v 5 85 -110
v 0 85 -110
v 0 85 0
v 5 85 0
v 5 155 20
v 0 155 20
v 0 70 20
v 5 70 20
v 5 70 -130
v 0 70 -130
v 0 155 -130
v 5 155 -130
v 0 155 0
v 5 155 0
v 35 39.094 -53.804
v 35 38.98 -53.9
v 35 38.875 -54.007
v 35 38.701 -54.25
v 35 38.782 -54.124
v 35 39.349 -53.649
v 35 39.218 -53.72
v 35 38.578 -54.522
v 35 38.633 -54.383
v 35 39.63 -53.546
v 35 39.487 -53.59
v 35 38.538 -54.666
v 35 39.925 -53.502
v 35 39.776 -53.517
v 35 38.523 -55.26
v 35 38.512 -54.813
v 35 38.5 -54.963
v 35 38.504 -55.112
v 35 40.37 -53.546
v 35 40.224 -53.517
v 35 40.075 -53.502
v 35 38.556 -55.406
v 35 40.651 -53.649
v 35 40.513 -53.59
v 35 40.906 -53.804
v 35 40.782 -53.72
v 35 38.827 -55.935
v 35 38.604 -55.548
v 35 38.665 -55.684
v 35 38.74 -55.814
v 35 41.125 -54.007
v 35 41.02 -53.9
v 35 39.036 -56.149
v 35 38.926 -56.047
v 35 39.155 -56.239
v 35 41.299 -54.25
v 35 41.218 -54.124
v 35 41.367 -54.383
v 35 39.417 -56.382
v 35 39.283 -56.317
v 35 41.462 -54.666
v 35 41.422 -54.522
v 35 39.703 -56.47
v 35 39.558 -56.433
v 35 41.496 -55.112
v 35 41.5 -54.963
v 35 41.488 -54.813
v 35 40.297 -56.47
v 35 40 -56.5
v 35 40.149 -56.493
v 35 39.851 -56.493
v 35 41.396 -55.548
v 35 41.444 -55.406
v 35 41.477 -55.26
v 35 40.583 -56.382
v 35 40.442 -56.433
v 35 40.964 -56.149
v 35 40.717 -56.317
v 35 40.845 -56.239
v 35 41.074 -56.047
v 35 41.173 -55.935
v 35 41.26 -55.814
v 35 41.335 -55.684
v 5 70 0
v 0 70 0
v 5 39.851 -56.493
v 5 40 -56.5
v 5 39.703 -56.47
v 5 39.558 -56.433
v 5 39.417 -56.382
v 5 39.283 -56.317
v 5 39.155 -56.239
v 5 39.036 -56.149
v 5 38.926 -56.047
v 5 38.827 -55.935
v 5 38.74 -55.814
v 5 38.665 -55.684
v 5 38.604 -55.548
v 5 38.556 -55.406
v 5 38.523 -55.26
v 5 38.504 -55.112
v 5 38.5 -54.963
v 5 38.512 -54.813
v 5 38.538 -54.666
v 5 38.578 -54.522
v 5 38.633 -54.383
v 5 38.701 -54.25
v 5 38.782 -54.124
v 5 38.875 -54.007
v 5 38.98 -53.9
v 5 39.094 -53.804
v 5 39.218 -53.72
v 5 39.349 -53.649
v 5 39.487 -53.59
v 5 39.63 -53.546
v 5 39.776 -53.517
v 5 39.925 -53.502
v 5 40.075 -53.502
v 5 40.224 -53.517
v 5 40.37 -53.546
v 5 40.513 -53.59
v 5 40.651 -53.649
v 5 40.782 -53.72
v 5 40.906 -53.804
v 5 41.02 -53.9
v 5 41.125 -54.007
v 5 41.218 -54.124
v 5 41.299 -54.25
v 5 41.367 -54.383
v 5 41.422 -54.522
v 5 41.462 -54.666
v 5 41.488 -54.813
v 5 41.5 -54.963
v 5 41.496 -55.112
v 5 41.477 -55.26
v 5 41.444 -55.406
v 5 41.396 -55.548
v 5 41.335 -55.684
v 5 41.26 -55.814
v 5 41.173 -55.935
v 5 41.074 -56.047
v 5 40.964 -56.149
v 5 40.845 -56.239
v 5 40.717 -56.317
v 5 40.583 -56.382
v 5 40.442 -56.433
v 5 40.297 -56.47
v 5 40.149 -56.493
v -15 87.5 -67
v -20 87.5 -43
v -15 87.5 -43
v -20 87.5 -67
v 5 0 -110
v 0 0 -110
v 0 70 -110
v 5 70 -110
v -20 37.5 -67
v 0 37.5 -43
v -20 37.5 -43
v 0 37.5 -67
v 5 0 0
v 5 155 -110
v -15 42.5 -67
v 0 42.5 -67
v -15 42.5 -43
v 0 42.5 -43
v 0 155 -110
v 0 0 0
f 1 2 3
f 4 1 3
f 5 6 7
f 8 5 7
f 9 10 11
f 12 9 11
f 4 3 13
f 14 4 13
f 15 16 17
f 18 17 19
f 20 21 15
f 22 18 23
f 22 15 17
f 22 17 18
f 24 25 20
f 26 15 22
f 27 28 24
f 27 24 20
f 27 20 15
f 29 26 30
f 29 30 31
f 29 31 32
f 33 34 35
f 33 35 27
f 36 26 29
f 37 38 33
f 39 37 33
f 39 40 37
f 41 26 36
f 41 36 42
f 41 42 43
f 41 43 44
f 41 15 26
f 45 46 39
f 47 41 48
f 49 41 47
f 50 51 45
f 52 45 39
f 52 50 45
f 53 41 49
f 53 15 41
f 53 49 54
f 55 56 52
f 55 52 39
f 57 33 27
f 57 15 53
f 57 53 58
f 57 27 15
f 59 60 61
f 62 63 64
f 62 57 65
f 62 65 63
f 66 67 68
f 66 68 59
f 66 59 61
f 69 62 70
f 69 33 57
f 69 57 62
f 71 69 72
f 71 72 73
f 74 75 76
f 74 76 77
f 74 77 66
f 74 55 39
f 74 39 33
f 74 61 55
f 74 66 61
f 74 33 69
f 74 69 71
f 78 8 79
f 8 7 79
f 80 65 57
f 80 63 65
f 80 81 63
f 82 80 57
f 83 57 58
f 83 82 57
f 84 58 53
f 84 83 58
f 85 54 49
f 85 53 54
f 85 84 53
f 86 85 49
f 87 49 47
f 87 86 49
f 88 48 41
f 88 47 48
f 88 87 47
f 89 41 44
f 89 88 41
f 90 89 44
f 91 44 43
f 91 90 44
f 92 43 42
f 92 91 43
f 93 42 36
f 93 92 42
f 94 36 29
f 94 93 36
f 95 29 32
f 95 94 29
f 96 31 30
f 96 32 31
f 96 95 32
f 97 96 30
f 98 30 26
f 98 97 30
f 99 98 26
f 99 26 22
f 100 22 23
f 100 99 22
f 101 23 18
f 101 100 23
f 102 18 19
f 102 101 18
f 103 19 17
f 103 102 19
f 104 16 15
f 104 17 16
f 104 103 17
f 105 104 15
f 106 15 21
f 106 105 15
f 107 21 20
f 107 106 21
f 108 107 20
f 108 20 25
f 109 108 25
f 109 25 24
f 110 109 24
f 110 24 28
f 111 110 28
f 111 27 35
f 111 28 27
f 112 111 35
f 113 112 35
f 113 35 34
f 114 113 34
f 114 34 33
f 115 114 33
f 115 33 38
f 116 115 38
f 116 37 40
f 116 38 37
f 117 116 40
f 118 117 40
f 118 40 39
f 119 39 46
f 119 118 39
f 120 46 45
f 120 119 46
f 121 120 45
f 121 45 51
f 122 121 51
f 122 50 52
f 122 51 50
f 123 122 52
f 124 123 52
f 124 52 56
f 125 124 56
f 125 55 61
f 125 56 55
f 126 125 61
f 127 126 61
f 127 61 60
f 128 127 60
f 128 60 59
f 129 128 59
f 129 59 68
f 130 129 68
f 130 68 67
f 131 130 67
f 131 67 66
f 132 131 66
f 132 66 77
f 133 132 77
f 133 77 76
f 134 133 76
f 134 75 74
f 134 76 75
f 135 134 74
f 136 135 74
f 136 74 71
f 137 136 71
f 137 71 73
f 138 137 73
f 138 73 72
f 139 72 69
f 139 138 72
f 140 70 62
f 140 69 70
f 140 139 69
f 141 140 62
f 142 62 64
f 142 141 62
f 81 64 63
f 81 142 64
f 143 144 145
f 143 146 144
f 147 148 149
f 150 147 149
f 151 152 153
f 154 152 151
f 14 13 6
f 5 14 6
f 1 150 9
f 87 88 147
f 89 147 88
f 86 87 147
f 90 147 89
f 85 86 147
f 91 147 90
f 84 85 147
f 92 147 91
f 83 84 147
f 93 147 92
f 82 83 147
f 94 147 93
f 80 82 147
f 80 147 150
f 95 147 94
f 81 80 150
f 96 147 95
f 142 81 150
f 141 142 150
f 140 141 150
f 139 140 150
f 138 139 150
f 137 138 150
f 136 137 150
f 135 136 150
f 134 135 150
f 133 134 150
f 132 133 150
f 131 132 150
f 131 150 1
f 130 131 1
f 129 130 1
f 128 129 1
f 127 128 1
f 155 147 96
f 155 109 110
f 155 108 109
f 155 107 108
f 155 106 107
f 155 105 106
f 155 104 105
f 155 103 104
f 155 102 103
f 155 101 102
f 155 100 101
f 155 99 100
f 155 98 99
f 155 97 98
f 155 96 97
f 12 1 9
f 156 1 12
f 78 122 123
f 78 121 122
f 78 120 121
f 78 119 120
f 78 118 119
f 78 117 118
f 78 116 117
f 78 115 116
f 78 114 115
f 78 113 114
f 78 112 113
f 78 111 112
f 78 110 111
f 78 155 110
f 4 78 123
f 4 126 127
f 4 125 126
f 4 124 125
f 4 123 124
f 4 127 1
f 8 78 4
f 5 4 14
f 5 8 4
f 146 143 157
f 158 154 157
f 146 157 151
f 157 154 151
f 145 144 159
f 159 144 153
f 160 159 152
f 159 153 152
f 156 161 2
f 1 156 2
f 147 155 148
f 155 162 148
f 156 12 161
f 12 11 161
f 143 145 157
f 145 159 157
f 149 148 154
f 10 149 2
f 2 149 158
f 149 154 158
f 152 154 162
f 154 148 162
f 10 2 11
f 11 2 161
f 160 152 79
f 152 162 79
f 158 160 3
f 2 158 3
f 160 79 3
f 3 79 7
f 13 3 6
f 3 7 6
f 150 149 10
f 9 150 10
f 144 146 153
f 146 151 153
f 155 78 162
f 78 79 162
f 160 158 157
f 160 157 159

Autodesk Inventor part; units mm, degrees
ref_plane "YZ Plane" through (0, 0, 0) normal (1, 0, 0) x (0, 1, 0)
ref_plane "XZ Plane" through (0, 0, 0) normal (0, 1, 0) x (-1, 0, 0)
ref_plane "XY Plane" through (0, 0, 0) normal (0, 0, 1) x (1, 0, 0)
sketch "Sketch1" plane through (0, 0, 0) normal (1, 0, 0) x (0, 1, 0)
  line L0 (0, 0) -> (0, -110)
  line L1 (0, 0) -> (110, 0) construction
  line L2 (0, -110) -> (70, -110)
  line L3 (0, -110) -> (70, -110) construction
  line L4 (70, -110) -> (70, -130)
  line L5 (70, -130) -> (155, -130)
  line L6 (70, -130) -> (155, -130) construction
  line L7 (155, -130) -> (155, -110)
  line L8 (155, -110) -> (85, -110)
  line L9 (85, -110) -> (85, 0)
  line L10 (85, 0) -> (155, 0)
  line L11 (155, 0) -> (155, 20)
  line L12 (155, 20) -> (70, 20)
  line L13 (70, 20) -> (70, 0)
  line L14 (70, 0) -> (0, 0)
  dimension "d0" = 110
  dimension "d1" = 90
  dimension "d2" = 70
  dimension "d3" = 0
  dimension "d4" = 20
  dimension "d5" = 85
  dimension "d6" = 0
  dimension "d7" = 20
  dimension "d8" = 70
  dimension "d9" = 110
  dimension "d10" = 90
  dimension "d11" = 70
  dimension "d12" = 90
  dimension "d13" = 20
  dimension "d14" = 90
  dimension "d15" = 85
  dimension "d16" = 90
extrude "Extrusion1" add sketch "Sketch1" along normal blind 5
sketch "Sketch2" plane through (5, 0, 0) normal (1, 0, 0) x (0, 0, -1)
  point P0 (0, 0)
  point P1 (55, 40)
sketch "Sketch3" plane through (5, 0, 0) normal (1, 0, 0) x (0, 0, -1)
  circle A0 centre (55, 40) radius 1.5
  point P0 (0, 0)
  dimension "d19" = 3
extrude "Extrusion2" add sketch "Sketch3" along normal blind 30
sketch "Sketch4" plane through (0, 0, 0) normal (-1, 0, 0) x (0, 0, 1)
  line L0 (-67, 42.5) -> (-43, 42.5)
  line L1 (-43, 42.5) -> (-43, 37.5)
  line L2 (-43, 37.5) -> (-67, 37.5)
  line L3 (-67, 37.5) -> (-67, 42.5)
  circle A0 centre (-55, 40) radius 1.5 projected
  line L4 (-67, 42.5) -> (-43, 37.5) construction
  line L5 (-43, 42.5) -> (-67, 37.5) construction
  point P0 (0, 0)
  dimension "d22" = 24
  dimension "d23" = 5
sketch "Sketch5" plane through (0, 0, 0) normal (-1, 0, 0) x (0, 0, 1)
  point P0 (0, 0)
sketch "Sketch6" plane through (0, 0, 0) normal (-1, 0, 0) x (0, 0, 1)
  circle A0 centre (-55, 40) radius 1.5
  point P0 (0, 0)
extrude "Extrusion3" add sketch "Sketch4" along normal blind 20 contours L0 L1 L2 L3 | A0
sketch "Sketch7" plane through (0, 42.5, -43) normal (0, 1, 0) x (1, 0, 0)
  line L0 (-20, 24) -> (-20, 0) projected
  line L1 (0, 24) -> (-20, 24) projected
  line L2 (-20, 0) -> (-15, 0)
  line L3 (-15, 0) -> (-15, 24)
  line L4 (-15, 24) -> (-20, 24)
  line L5 (-20, 24) -> (-20, 0)
  point P0 (0, -43)
  dimension "d26" = 5
extrude "Extrusion4" add sketch "Sketch7" along normal blind 45
sketch "Sketch9" plane through (5, 0, 0) normal (1, 0, 0) x (0, 0, -1)
  point P0 (0, 0)
properties part number "part1 edited" material "Wood (Walnut)"
